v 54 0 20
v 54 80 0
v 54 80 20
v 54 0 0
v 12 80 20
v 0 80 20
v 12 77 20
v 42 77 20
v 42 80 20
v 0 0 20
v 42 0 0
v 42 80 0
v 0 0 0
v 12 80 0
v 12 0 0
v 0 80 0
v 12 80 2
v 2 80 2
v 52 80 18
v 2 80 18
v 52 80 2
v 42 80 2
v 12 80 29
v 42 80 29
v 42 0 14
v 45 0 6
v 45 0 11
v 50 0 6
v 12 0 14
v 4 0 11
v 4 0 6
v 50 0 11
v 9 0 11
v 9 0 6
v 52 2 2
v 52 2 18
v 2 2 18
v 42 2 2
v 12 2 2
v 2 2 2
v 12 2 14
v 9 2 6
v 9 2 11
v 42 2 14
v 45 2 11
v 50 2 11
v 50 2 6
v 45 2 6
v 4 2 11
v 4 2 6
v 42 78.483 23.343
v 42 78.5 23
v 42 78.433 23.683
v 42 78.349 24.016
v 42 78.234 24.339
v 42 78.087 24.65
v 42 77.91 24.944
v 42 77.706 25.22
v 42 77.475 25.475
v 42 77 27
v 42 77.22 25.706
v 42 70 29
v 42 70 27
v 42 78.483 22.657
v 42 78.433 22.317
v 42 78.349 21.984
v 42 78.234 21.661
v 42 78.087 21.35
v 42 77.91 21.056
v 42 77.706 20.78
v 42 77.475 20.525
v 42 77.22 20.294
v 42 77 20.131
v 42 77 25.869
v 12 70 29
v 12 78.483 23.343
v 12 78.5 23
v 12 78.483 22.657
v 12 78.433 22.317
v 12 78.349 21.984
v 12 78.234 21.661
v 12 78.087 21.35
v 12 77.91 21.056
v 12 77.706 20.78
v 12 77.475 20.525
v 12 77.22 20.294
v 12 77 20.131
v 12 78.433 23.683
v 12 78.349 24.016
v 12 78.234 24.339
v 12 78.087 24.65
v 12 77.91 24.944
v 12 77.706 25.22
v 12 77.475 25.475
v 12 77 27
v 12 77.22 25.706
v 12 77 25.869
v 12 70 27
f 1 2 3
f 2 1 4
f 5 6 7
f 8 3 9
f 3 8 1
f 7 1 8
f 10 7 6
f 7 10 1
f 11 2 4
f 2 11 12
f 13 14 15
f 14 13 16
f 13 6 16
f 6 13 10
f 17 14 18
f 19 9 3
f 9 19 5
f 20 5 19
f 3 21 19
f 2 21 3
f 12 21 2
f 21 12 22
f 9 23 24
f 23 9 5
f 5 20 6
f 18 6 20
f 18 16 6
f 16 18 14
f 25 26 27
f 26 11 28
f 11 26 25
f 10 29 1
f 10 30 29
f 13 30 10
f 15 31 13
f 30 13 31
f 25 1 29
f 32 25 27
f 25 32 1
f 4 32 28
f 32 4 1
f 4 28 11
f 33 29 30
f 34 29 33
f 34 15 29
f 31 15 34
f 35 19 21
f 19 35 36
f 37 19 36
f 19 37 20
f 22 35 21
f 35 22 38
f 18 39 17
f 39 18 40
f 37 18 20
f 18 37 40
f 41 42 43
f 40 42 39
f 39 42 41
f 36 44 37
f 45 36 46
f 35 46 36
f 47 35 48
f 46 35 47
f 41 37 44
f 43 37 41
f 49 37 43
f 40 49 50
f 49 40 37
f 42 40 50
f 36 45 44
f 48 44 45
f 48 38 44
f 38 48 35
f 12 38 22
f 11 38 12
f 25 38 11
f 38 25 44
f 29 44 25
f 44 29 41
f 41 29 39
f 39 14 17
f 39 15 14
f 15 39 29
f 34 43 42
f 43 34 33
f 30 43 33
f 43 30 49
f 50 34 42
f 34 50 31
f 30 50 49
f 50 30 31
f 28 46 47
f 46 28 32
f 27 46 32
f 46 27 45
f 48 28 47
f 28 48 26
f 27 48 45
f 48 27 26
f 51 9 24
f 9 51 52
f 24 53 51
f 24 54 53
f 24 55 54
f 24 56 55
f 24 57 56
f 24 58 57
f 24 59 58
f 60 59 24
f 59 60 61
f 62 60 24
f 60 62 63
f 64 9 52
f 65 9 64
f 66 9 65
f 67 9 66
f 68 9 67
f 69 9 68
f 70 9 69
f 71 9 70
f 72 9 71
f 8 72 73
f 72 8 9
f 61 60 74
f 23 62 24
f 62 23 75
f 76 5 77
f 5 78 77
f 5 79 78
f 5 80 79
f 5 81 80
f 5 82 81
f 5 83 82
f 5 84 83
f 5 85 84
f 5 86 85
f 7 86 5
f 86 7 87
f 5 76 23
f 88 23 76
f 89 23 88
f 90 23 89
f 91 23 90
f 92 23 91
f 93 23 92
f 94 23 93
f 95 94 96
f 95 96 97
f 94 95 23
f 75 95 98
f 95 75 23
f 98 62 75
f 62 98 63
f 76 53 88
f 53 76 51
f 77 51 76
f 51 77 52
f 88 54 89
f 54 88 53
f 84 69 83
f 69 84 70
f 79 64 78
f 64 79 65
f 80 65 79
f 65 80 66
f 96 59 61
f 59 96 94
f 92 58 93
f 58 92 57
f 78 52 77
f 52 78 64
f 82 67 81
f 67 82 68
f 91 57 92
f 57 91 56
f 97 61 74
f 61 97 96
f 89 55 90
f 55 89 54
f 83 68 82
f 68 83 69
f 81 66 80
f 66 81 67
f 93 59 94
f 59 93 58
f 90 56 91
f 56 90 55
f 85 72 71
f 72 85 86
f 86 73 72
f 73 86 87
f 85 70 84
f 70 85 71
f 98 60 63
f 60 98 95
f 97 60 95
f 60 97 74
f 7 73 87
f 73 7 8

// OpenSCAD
$fn = 64;
difference()
{
  cube([54,80,20]);
  translate([2,2,2]) cube([50,90,16]);
  translate([12,-2,-2]) cube([30,90,16]);
  translate([4,-2,6]) cube([5,5,5]);
  translate([45,-2,6]) cube([5,5,5]);
}

difference()
{
  translate([12,70,19]) cube([30,10,10]);
  rotate([90,0,90]) 
    translate([75,23,10]) 
      cylinder(h=35,d=7);
  translate([10,67,20]) cube([35,10,7]);
}
